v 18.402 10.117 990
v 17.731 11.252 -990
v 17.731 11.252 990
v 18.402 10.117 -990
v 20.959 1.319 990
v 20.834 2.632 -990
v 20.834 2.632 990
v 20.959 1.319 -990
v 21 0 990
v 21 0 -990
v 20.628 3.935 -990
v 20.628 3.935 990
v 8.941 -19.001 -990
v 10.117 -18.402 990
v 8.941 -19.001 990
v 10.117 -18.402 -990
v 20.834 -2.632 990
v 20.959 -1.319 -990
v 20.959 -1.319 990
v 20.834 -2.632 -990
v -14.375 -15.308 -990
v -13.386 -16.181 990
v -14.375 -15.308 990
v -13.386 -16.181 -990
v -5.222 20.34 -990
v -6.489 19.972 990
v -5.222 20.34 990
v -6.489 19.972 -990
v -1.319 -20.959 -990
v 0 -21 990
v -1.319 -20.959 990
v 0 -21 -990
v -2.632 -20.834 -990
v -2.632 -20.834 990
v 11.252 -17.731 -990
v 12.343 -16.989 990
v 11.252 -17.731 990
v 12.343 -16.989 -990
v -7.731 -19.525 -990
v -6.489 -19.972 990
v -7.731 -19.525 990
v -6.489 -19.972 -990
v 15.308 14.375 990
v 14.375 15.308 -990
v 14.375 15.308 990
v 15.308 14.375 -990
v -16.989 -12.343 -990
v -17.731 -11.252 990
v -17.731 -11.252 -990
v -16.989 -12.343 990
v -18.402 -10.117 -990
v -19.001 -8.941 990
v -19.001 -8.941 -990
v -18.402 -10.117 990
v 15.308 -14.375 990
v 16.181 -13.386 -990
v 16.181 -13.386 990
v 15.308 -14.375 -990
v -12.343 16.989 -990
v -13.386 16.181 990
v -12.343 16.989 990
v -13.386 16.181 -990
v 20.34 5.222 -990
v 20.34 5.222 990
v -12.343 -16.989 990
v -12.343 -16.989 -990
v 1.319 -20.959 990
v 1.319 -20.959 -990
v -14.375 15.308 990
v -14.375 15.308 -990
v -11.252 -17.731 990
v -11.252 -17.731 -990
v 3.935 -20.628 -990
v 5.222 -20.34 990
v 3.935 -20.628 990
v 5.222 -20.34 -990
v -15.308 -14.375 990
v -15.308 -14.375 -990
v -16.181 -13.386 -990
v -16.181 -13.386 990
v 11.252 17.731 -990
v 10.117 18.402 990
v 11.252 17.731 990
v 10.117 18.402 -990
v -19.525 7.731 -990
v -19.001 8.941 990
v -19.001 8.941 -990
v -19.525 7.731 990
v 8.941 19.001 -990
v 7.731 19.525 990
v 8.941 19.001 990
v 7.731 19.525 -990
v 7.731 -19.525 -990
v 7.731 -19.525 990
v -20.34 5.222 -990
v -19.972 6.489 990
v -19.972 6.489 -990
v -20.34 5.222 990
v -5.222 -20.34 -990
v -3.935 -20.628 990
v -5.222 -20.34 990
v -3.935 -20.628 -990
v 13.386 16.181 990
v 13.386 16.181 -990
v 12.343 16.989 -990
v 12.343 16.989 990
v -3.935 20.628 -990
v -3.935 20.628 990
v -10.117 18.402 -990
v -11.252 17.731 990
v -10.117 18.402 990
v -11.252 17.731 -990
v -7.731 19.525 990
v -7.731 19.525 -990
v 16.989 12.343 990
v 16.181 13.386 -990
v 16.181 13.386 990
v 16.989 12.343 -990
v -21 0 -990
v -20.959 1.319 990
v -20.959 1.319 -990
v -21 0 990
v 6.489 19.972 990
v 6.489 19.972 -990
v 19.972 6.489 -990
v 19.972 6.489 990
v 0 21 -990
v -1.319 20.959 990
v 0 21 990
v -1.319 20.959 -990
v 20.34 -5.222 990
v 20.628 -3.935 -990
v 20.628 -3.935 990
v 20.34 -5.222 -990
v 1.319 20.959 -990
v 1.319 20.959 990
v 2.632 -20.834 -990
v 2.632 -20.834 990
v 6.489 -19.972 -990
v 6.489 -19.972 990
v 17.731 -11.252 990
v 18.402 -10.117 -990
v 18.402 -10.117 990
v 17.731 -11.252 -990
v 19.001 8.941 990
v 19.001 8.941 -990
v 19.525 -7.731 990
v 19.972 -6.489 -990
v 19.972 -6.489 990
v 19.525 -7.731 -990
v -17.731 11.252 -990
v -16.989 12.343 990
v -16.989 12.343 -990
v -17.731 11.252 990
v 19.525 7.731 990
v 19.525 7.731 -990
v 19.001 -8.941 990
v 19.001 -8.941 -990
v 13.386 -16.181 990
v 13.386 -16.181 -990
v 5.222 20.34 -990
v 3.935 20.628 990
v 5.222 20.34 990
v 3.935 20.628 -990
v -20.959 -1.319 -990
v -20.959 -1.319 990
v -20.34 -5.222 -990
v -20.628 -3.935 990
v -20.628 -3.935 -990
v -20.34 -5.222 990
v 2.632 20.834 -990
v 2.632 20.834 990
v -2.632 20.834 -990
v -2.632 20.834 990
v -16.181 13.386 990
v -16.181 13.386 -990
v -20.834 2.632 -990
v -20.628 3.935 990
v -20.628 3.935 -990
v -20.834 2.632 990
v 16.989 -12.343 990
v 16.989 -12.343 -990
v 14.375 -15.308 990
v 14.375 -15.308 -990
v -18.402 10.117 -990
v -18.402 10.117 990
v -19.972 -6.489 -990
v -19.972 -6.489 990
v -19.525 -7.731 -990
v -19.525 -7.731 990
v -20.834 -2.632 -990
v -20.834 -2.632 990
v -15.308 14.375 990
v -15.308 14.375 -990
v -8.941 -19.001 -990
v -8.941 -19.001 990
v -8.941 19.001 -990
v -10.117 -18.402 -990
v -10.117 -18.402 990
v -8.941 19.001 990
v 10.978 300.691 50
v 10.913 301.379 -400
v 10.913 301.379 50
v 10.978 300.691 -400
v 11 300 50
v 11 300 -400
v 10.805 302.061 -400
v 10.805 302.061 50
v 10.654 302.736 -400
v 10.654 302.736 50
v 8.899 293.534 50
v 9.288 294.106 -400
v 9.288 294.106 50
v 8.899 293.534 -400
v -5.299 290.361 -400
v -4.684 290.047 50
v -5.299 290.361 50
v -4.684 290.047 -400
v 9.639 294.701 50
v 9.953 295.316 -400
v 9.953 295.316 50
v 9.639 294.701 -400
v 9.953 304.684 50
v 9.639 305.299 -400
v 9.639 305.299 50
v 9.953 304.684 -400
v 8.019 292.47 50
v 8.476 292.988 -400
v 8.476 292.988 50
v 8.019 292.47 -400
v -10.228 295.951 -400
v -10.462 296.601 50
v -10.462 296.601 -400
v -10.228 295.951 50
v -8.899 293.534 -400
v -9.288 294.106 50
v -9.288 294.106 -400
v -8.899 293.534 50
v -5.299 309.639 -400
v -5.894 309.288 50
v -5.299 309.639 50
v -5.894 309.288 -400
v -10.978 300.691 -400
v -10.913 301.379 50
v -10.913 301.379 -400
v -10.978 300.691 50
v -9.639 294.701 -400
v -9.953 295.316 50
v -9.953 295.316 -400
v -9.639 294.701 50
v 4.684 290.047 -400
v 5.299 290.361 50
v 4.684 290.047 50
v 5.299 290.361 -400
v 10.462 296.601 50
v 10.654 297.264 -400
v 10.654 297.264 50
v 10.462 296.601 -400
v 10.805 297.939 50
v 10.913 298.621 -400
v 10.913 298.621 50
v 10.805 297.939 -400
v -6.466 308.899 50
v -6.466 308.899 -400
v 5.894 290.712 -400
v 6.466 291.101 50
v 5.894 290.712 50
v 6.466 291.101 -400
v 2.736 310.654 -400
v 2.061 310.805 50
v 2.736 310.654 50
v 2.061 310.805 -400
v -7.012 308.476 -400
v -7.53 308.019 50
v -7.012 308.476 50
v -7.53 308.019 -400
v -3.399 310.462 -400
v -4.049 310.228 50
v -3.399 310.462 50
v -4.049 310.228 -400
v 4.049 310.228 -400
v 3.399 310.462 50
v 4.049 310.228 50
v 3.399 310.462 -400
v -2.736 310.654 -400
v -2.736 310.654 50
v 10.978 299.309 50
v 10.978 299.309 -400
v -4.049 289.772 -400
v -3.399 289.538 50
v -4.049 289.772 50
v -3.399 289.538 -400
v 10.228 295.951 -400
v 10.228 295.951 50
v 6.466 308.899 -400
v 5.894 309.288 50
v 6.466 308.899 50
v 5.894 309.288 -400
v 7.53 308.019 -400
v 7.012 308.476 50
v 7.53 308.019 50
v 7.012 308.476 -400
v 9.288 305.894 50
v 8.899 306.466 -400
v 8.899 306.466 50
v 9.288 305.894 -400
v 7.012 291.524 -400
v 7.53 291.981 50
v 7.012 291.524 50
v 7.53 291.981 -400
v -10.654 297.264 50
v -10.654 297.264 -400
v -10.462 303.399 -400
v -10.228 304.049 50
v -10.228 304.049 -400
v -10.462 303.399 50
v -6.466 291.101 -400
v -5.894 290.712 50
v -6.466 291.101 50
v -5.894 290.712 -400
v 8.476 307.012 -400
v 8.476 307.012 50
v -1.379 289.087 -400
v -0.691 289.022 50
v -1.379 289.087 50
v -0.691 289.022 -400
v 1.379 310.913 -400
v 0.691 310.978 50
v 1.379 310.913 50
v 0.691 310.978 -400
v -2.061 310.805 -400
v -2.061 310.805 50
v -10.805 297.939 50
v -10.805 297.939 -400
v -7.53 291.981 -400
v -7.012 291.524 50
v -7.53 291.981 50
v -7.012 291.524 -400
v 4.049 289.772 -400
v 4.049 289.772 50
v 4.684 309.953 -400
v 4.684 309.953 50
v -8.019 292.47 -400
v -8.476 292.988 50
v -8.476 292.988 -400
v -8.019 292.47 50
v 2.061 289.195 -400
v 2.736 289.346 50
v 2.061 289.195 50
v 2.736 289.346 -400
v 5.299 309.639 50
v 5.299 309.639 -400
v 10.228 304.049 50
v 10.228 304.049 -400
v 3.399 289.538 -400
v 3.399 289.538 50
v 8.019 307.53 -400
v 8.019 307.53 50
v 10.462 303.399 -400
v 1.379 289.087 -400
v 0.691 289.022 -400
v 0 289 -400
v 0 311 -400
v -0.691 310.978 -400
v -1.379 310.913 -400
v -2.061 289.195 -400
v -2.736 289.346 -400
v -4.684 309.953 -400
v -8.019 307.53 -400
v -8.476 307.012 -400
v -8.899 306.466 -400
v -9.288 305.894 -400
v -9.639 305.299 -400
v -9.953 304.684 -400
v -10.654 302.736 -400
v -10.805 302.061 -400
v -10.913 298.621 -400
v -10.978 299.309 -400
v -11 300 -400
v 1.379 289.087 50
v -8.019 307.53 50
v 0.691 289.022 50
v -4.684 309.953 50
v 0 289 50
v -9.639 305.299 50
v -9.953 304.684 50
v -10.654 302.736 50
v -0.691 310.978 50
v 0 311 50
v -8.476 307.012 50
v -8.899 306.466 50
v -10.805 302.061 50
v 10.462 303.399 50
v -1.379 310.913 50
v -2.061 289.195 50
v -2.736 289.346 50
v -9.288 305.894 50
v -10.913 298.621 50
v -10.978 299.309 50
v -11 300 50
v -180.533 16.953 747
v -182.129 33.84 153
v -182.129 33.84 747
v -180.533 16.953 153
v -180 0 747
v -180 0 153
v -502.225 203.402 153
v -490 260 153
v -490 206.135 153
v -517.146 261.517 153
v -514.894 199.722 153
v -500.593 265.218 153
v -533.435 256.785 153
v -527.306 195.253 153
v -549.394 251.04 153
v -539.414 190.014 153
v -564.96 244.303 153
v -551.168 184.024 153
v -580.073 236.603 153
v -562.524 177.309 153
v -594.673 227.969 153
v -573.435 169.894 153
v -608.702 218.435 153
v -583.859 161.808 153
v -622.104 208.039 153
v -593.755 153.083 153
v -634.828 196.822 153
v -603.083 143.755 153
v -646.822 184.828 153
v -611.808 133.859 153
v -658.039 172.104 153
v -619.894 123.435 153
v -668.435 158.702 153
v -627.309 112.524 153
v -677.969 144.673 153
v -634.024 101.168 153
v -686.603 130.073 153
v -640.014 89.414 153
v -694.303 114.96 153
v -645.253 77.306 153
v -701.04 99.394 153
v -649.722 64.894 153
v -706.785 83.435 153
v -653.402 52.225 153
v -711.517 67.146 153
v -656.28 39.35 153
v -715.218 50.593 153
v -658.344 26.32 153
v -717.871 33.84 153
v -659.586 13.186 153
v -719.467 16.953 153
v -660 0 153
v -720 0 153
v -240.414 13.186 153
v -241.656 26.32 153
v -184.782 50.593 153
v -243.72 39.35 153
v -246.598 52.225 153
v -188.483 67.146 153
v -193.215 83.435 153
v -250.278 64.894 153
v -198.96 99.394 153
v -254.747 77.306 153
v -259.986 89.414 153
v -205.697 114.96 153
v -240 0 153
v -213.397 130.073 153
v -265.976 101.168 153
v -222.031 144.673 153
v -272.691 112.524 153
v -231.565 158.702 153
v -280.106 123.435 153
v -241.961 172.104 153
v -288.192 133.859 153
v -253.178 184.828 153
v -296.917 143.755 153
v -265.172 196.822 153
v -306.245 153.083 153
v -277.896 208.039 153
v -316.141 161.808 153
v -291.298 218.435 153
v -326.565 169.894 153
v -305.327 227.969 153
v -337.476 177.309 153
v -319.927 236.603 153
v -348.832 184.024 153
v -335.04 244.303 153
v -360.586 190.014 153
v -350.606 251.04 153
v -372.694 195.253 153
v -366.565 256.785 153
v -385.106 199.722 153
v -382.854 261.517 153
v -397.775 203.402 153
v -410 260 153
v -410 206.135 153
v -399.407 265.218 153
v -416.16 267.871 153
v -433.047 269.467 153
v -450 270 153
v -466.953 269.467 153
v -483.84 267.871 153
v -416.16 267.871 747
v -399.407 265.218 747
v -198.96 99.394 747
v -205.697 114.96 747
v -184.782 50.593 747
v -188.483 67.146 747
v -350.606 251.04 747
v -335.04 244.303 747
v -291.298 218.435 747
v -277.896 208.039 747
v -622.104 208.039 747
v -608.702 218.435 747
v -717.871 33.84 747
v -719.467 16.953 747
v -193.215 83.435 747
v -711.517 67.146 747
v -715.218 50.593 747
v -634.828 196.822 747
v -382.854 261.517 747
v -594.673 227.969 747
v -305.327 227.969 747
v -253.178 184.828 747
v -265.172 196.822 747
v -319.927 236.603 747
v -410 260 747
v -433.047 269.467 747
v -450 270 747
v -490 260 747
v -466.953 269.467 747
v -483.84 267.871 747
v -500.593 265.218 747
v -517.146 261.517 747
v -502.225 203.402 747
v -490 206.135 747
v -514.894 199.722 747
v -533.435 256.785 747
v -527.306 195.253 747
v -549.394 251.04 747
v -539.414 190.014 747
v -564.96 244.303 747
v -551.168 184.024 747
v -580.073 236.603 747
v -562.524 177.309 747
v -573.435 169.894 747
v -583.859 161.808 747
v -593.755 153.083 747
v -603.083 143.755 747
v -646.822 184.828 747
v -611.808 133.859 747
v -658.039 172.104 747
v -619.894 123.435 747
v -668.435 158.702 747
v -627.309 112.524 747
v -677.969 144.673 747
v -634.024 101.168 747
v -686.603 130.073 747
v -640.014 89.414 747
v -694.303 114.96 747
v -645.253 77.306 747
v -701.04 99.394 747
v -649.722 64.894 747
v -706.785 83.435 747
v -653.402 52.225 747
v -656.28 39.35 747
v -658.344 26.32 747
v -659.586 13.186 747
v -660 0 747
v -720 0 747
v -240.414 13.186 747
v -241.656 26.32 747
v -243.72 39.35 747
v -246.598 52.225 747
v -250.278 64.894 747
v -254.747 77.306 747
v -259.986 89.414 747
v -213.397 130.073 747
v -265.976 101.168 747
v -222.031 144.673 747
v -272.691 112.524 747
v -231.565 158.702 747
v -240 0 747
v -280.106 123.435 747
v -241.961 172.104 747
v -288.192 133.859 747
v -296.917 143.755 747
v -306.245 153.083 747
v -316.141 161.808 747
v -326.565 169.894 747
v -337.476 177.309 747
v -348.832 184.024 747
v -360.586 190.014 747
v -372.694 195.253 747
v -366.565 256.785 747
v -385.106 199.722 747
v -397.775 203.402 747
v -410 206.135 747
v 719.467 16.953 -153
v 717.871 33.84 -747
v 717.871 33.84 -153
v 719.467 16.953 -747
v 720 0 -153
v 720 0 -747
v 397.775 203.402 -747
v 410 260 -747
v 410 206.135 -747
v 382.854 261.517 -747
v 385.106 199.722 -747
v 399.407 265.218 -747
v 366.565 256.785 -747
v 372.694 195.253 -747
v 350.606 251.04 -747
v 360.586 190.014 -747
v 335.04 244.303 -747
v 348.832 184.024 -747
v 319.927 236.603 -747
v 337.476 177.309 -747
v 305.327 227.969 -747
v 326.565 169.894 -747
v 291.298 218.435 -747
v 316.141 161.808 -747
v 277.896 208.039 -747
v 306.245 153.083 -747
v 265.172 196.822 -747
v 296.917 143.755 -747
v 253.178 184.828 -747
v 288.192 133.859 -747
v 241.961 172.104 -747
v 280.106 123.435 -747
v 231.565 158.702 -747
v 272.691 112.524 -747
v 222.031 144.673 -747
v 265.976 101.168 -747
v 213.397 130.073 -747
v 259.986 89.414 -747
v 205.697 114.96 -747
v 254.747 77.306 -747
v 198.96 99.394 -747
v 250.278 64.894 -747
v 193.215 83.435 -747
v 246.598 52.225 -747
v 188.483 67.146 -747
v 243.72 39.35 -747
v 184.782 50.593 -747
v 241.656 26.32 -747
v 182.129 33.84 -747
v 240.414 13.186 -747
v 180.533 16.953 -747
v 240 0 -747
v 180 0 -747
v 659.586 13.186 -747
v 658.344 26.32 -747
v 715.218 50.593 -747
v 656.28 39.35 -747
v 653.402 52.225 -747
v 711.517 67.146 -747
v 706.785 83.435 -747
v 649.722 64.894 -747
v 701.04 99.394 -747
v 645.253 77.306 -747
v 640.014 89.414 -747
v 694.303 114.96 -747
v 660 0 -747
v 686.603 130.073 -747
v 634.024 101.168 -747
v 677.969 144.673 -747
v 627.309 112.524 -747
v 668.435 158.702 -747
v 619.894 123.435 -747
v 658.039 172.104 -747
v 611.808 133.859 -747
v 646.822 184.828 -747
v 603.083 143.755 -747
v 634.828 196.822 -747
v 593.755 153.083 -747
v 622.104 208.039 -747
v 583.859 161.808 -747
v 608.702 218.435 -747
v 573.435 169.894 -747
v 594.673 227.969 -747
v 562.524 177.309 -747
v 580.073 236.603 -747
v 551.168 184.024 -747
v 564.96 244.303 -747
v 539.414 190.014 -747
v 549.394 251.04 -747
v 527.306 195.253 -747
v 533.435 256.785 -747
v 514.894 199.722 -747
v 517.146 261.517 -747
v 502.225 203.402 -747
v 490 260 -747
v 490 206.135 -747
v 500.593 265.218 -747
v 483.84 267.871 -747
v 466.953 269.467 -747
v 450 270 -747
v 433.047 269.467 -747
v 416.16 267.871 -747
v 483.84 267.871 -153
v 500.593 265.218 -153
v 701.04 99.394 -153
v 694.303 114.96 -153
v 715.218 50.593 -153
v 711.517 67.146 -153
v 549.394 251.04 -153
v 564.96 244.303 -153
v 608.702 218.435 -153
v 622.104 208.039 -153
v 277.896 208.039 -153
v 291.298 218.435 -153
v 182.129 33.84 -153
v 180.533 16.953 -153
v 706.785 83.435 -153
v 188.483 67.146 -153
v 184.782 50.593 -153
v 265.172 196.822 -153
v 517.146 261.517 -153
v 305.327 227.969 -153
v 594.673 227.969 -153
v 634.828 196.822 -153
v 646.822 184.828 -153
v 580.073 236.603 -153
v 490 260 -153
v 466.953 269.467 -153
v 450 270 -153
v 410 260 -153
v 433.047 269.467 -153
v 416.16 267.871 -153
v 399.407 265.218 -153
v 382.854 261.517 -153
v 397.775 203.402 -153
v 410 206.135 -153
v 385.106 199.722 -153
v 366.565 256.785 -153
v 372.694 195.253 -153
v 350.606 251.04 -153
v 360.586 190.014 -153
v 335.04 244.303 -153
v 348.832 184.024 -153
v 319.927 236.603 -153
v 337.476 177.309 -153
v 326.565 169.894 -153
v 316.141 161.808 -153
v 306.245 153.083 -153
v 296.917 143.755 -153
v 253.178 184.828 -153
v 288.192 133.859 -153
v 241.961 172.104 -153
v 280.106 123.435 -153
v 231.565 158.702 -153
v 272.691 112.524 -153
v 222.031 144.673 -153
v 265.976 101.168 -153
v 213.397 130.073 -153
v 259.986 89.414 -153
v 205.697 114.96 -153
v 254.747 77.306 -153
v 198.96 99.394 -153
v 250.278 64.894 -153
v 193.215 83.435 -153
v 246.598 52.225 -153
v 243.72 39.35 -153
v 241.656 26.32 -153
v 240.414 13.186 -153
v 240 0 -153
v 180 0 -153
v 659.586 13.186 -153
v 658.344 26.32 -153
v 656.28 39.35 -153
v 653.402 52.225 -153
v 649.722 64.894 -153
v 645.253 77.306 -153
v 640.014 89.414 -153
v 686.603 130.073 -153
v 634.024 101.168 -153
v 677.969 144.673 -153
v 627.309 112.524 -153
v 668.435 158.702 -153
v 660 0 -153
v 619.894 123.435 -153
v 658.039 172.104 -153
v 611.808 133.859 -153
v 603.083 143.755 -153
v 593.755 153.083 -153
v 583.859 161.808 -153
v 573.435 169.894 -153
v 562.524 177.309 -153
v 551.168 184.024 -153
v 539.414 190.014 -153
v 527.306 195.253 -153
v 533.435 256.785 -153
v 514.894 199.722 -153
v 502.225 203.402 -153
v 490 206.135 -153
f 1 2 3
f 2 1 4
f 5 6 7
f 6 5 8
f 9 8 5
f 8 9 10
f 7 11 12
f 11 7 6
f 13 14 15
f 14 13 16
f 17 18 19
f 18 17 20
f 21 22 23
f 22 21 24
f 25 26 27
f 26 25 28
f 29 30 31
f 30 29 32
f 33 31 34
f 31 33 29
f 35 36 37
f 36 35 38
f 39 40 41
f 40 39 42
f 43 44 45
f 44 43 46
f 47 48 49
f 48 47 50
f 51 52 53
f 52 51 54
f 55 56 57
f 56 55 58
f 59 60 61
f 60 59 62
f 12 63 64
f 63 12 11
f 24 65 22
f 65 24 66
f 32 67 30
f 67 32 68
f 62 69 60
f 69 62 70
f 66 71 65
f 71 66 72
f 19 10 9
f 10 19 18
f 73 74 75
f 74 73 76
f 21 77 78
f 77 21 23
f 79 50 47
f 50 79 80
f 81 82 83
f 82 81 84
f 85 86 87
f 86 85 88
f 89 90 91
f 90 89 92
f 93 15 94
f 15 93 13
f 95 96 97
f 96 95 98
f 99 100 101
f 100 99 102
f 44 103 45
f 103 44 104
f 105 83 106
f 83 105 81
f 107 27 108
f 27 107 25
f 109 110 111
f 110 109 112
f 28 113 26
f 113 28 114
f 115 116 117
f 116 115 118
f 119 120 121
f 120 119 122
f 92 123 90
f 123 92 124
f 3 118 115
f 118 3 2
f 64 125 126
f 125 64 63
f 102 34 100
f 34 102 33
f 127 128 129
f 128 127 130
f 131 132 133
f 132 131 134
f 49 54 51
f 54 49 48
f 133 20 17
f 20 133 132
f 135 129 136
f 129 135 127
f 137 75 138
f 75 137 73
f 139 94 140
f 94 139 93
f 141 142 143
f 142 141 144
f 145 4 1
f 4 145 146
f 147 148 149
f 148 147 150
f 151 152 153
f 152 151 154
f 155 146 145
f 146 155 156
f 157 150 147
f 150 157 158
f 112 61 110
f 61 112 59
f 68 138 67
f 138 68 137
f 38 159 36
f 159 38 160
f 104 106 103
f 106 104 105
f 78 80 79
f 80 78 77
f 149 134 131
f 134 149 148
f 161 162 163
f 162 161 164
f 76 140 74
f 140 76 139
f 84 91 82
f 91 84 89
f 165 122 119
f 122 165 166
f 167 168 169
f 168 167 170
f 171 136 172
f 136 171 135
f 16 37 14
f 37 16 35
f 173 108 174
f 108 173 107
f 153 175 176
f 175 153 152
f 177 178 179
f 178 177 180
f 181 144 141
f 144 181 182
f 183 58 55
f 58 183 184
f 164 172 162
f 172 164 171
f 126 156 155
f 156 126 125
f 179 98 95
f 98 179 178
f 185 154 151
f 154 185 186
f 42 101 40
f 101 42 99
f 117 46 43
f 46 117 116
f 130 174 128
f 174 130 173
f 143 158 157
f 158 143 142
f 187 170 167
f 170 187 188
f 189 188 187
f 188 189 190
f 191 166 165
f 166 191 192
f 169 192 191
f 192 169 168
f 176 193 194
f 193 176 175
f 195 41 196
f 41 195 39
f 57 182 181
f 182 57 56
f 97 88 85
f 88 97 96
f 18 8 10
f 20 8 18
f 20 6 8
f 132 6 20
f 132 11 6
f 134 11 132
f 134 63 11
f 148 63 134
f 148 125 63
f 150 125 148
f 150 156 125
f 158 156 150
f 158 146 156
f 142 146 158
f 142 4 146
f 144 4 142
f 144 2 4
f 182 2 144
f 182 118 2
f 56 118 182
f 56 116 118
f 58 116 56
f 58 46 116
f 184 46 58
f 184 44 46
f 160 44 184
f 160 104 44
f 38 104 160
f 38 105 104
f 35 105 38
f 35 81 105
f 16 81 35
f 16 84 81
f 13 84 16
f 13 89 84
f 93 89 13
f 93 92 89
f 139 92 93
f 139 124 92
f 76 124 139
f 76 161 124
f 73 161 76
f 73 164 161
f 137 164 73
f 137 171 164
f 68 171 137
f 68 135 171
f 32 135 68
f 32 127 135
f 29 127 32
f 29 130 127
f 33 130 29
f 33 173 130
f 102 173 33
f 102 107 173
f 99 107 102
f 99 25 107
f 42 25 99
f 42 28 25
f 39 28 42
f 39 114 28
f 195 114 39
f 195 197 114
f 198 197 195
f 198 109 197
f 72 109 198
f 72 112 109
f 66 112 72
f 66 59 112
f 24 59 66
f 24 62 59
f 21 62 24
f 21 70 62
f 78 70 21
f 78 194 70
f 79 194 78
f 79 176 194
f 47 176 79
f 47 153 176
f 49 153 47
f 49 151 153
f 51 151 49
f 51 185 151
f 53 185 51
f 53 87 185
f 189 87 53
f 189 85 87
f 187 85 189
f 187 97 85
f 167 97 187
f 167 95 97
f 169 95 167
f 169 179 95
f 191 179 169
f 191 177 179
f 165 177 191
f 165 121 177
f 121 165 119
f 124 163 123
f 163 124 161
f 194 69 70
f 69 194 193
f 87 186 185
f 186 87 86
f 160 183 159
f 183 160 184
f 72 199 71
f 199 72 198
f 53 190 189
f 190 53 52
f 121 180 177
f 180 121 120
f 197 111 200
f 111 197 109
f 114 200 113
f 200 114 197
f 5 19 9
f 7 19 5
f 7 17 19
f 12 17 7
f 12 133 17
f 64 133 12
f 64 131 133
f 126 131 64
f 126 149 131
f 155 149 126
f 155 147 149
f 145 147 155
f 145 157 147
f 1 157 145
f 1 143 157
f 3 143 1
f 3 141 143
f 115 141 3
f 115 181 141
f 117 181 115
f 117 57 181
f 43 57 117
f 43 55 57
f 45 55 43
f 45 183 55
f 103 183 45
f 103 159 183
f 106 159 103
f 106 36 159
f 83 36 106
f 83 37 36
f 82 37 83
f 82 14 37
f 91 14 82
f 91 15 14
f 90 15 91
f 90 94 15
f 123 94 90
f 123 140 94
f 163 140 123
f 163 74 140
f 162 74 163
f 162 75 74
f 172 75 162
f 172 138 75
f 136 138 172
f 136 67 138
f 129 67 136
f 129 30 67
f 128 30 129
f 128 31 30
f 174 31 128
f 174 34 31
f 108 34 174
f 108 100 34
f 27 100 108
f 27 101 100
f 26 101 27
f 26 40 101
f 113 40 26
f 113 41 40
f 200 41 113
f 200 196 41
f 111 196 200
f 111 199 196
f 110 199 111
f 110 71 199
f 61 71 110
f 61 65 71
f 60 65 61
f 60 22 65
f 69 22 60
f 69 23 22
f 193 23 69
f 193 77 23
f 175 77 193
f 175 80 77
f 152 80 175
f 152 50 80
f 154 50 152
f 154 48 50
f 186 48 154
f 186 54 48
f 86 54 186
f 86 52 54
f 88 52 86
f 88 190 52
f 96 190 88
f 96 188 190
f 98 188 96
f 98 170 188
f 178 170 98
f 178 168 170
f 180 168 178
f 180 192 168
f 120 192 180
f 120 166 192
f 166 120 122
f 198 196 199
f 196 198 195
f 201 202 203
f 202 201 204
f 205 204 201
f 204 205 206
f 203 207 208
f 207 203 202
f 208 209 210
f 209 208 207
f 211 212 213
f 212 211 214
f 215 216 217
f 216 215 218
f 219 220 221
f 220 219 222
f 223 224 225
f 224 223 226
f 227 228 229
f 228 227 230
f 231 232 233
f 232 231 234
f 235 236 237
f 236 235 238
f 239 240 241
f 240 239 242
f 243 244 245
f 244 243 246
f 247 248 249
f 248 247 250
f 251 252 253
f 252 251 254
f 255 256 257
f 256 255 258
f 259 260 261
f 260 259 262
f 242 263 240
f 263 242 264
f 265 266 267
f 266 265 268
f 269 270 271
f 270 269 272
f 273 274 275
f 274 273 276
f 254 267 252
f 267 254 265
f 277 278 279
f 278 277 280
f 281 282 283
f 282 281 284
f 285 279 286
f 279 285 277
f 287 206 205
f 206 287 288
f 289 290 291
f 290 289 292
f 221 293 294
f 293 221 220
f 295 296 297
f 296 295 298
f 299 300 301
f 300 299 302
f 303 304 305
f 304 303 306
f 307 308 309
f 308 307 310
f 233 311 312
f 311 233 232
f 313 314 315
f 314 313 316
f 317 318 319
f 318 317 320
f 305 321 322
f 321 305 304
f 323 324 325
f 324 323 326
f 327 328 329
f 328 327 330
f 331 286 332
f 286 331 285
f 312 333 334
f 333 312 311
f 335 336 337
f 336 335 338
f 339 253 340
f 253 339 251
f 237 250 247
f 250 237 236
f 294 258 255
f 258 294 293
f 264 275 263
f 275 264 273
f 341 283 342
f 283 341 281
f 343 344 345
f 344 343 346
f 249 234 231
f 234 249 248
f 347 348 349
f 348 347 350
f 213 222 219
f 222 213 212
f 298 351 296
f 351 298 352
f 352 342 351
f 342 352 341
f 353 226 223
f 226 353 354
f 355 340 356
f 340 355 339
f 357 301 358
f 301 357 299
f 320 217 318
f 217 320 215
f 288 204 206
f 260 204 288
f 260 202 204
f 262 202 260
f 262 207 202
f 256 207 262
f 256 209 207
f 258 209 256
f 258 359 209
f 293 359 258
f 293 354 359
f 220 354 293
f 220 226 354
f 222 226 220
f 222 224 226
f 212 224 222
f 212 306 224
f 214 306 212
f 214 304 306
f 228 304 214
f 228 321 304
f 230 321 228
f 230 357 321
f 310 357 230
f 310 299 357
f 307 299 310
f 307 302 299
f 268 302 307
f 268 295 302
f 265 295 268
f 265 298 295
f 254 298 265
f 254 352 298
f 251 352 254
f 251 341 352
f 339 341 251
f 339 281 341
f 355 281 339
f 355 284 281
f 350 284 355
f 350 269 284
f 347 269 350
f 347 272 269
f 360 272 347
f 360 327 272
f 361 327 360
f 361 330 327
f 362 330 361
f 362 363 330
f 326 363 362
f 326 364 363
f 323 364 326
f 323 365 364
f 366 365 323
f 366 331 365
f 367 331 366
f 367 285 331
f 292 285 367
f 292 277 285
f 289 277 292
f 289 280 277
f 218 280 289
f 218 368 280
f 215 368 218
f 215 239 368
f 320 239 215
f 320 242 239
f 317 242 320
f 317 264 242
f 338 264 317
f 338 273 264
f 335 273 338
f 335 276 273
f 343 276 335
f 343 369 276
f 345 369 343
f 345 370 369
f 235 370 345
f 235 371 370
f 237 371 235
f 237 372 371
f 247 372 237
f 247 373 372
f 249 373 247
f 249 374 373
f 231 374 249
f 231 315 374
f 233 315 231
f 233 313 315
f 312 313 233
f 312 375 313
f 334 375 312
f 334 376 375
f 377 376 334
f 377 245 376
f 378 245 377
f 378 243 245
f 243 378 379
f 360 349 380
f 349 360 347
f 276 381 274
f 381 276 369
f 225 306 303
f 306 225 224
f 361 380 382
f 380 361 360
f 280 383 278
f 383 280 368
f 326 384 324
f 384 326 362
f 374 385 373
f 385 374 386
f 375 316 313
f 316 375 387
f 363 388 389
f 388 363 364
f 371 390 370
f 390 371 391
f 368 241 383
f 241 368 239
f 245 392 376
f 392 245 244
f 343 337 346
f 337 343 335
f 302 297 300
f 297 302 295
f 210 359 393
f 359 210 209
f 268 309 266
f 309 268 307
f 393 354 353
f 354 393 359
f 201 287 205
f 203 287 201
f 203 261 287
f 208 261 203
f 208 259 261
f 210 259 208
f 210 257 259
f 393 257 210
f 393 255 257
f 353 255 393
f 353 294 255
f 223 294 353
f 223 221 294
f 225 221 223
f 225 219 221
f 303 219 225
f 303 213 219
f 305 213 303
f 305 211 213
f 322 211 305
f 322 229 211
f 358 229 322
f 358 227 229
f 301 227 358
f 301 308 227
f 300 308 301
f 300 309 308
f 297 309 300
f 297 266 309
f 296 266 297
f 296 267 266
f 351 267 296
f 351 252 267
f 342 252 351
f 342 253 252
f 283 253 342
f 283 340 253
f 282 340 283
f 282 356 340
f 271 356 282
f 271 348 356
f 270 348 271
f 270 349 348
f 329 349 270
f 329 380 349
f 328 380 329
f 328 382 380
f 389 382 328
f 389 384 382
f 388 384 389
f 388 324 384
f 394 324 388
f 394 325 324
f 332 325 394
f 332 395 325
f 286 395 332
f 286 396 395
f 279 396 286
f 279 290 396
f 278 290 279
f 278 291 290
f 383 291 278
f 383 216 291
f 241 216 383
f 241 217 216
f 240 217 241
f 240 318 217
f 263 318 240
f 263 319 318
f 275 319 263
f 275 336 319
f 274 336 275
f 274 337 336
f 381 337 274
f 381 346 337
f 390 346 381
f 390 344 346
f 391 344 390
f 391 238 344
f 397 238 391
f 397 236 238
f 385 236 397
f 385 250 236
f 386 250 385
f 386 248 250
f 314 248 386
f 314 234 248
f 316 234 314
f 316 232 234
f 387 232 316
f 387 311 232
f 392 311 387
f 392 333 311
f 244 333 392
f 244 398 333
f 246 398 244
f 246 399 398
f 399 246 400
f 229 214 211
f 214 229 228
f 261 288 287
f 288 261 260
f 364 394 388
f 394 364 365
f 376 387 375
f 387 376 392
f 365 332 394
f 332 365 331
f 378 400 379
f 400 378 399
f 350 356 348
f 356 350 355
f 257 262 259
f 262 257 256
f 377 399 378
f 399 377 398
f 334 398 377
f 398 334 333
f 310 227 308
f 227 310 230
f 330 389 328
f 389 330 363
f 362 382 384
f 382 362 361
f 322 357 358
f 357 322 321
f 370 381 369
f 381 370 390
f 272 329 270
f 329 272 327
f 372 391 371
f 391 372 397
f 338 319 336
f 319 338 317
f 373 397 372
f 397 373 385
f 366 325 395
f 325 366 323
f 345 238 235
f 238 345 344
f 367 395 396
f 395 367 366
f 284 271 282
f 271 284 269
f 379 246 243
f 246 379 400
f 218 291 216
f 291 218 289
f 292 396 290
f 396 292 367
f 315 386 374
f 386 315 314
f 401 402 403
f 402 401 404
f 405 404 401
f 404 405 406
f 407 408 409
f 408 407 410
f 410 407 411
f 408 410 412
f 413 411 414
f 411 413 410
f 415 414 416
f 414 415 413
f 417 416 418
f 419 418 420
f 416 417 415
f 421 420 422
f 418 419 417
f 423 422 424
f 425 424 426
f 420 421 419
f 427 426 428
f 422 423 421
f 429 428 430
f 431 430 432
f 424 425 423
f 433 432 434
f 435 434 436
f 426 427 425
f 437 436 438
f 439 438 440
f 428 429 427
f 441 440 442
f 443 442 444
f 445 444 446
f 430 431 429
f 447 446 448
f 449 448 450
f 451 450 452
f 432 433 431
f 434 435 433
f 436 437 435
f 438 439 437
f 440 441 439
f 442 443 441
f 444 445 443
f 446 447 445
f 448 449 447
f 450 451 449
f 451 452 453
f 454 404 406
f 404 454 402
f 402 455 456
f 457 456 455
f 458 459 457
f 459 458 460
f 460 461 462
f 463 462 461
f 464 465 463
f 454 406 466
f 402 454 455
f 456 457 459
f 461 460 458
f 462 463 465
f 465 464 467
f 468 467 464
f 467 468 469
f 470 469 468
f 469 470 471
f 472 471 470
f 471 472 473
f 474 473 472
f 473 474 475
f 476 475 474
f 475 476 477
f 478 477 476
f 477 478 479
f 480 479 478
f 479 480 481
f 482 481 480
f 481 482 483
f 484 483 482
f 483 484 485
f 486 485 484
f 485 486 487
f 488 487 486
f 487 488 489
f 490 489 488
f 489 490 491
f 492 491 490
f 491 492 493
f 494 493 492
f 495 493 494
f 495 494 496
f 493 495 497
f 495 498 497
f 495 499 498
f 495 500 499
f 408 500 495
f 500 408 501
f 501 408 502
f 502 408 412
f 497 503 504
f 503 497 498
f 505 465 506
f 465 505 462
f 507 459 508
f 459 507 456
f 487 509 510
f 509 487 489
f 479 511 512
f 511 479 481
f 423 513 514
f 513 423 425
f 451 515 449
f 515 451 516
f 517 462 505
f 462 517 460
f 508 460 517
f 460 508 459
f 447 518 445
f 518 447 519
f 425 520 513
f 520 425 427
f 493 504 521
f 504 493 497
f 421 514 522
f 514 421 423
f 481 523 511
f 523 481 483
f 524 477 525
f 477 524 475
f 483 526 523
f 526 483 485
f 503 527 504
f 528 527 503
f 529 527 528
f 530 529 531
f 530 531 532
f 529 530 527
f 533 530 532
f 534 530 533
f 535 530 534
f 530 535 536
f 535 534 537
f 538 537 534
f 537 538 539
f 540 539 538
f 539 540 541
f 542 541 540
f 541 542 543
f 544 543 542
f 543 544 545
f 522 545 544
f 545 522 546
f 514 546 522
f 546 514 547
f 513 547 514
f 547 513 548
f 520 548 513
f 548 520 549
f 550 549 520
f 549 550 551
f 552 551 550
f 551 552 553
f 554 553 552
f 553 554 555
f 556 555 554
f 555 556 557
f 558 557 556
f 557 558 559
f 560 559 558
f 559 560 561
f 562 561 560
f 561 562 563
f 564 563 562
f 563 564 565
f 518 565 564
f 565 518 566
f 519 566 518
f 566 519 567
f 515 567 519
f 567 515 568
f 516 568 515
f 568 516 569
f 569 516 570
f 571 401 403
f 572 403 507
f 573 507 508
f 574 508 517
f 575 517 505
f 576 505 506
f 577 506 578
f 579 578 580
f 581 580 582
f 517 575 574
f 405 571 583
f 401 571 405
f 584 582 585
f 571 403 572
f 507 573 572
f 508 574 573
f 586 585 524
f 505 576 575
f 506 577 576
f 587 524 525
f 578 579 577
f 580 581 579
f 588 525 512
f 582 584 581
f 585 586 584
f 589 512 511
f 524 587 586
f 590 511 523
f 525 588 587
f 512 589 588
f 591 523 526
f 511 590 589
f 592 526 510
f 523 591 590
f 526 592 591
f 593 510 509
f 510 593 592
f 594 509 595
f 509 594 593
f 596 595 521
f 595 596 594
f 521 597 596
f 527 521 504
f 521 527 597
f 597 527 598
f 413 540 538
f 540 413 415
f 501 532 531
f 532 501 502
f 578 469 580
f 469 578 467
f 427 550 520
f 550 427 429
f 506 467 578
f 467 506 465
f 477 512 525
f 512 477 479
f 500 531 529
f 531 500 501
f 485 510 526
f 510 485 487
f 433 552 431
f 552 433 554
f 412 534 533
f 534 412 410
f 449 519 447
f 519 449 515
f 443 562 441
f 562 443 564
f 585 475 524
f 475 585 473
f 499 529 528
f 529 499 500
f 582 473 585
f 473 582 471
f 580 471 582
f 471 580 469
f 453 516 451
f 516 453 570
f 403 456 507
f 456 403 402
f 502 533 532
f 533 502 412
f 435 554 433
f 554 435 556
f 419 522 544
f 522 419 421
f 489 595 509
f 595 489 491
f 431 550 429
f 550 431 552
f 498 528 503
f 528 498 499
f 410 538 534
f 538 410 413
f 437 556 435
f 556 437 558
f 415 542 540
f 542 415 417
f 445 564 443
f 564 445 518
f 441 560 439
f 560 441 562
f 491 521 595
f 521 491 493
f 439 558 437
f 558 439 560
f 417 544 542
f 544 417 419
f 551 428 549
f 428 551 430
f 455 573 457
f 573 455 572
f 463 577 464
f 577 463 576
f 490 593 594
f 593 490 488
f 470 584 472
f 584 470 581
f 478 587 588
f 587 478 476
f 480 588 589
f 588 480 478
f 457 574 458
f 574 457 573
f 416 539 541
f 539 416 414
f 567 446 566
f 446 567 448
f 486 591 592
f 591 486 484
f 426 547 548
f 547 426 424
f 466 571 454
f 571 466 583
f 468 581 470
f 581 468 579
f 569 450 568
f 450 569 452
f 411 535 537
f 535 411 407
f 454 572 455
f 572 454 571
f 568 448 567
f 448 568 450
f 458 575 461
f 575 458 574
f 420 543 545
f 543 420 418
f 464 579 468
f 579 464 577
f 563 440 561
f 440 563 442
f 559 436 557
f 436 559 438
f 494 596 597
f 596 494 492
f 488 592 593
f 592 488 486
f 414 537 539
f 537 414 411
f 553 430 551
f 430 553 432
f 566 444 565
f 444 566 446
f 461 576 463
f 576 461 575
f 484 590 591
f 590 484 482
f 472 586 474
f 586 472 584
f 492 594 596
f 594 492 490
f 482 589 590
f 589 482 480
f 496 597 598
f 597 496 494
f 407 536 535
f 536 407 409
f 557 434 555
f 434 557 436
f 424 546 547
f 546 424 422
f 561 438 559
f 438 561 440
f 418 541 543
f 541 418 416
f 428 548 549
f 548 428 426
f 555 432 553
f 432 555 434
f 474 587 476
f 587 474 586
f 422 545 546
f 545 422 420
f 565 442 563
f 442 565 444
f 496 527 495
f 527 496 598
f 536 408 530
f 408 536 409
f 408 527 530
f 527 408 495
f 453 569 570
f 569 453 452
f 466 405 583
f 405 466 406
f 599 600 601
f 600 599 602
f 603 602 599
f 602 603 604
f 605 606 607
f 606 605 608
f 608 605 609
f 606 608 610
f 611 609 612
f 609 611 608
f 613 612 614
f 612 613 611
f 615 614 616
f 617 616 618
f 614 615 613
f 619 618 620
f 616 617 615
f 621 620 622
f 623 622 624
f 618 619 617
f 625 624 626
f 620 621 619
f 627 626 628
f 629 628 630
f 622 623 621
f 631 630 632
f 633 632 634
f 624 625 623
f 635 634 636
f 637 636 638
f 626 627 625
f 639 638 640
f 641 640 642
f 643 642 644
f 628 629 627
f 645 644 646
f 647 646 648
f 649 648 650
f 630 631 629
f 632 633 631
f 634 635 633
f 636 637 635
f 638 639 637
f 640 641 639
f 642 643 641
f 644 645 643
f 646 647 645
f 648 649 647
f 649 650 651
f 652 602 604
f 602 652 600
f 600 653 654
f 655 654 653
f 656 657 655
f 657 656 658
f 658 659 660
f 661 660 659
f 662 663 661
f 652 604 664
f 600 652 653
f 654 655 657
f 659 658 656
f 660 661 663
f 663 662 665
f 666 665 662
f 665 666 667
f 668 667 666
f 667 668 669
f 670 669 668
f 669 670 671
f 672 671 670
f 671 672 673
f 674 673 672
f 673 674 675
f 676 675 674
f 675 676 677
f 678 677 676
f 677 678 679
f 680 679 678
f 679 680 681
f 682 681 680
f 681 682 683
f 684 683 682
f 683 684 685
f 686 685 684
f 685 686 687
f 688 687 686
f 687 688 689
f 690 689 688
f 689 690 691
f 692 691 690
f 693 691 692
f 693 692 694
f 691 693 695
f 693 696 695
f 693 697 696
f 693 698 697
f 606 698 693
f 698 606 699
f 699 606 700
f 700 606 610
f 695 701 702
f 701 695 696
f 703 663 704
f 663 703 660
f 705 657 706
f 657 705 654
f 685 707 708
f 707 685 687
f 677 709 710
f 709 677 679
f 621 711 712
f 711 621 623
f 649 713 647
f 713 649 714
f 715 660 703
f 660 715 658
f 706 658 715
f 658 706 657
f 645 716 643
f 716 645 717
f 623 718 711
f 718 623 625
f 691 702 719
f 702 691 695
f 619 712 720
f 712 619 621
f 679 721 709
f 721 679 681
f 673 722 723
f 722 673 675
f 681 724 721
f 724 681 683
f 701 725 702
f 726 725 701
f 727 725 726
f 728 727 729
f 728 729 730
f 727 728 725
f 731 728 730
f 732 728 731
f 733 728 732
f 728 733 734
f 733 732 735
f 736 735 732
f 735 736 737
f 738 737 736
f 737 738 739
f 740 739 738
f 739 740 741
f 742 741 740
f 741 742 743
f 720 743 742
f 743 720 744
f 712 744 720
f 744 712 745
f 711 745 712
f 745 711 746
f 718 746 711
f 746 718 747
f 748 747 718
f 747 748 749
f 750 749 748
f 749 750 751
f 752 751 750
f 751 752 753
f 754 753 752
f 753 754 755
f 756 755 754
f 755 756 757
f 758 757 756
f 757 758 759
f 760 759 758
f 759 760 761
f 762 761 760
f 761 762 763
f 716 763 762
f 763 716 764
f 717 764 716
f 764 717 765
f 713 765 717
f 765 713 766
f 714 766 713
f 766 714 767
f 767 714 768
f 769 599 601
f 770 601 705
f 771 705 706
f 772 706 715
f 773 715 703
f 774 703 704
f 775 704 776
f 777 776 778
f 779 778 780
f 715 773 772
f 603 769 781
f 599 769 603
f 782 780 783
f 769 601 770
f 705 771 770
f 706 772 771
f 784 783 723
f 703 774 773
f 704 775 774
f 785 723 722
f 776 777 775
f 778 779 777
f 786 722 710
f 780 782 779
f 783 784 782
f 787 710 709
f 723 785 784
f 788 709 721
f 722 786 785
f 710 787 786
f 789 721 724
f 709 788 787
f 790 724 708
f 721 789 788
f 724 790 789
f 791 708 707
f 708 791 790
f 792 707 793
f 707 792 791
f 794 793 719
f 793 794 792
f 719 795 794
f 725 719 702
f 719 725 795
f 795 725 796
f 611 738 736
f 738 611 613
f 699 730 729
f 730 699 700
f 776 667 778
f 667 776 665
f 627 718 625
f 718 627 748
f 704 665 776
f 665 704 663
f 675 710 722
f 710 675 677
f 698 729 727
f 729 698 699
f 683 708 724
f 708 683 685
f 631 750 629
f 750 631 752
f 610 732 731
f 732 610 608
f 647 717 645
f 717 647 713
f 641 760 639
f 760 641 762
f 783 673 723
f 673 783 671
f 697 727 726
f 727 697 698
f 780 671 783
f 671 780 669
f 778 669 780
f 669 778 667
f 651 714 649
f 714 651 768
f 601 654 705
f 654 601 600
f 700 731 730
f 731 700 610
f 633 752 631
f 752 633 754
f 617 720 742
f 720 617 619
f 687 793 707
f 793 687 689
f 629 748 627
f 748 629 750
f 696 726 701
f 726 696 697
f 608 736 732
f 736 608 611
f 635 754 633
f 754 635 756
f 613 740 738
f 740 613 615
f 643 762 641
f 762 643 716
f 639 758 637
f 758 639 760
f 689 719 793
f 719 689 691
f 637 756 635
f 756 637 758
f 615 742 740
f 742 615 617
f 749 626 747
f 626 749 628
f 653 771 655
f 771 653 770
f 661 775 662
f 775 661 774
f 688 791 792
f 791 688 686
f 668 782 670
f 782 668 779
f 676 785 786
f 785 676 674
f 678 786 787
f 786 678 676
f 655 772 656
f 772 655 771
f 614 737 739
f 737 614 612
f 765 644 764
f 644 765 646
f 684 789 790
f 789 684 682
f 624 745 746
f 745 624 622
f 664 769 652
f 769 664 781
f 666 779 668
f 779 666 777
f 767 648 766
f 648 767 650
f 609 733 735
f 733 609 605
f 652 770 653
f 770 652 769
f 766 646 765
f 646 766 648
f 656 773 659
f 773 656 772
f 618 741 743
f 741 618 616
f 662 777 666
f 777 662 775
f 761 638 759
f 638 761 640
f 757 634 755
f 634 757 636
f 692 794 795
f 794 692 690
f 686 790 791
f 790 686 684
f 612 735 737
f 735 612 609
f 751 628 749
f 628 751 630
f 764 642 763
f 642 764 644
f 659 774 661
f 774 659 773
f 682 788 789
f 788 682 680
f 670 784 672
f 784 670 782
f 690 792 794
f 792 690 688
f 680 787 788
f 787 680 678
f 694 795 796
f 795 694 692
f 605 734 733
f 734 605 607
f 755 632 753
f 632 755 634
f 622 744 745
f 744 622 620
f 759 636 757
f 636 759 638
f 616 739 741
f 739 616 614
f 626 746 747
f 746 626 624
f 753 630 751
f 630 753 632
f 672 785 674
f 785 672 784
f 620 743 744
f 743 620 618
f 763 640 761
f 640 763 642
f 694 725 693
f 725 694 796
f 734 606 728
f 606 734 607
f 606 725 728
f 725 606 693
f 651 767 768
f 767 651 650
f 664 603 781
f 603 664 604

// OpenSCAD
// ============================================================================
// PROJECT: XXXG-00W0 WING GUNDAM ZERO EW - FLIGHT SURFACE INFRA
// COMPONENT VAULT: BANDAI CAST RUNNER W - PLUMAGE EXTENSIONS W11 & W12
// PACKAGING RE-ARCHITECTURE: SUB-ARMOR CAPACITOR RECESSED BANK INTEGRATION
// CONFIG METRIC: SCALED TITANIUM CASTS (1:1 ACTUAL METRIC UP-SCALE)
// ============================================================================

$fn = 100; // High-precision circular resolution segment count

// Structural Constants Scaled 1:1 for a 16.7-Meter Airframe Scale (mm)
extension_total_length = 1320;           // Total longitudinal vertical height (mm)
pivot_bore_diameter = 420;               // Core cycloidal stabilizer pin width (mm)
armor_skin_thickness = 60;              // Solid TiAl protective plating wall (mm)
harness_conduit_width = 80;             // Cast-in 4oz copper logic trace track (mm)
capacitor_pocket_depth = 15;            // Sub-armor recessed housing pocket depth (mm)
capacitor_pocket_width = 140;           // Transverse MLCC array pocket width (mm)

module Runner_W_Plumage_Extension_Forge() {
    // Central Supply Injection Runner Axis (Molten Feed Line from Siphon Forge)
    color([0.22, 0.22, 0.25]) {
        cylinder(h = extension_total_length * 1.5, d = 42, center = true);
        // Direct injection gates tracking straight into the part mold cavities
        translate() rotate() cylinder(h = 450, d = 22);
        translate([0, 300, -400]) rotate() cylinder(h = 450, d = 22);
    }
    
    // Instantiate Scaled Skeutomorphic Part Molds Symmetrically (Left & Right)
    Cast_Internal_Plumage_Extensions();
}

module Cast_Internal_Plumage_Extensions() {
    // ---- PART W11: INTERNAL LEFT DISTAL PLUMAGE EXTENSION STABILIZER ----
    translate([-450, 0, 450]) color([0.35, 0.35, 0.38]) { // Inner Frame Dark Spec
        difference() {
            // Main solid heavy-duty core joint connection block segment
            cylinder(h = extension_total_length * 0.45, d = pivot_bore_diameter + (armor_skin_thickness * 2), center = true);
            
            // Central Cycloidal Reduction Track Bore (Houses pre-loaded alignment pins)
            cylinder(h = extension_total_length * 0.5, d = pivot_bore_diameter, center = true);
            
            // SUB-ARMOR RECESSED CAPACITOR POCKETS [Segmented rows cut inside the armor inner wall]
            for (z_offset = [-150, 0, 150]) {
                translate([0, (pivot_bore_diameter/2 - armor_skin_thickness + capacitor_pocket_depth/2), z_offset])
                    cube([capacitor_pocket_width, capacitor_pocket_depth, 100], center = true);
            }
            
            // Continuous cast-in routing track for the 4oz solid-state wiring rails
            cube([harness_conduit_width, pivot_bore_diameter + 100, extension_total_length], center = true);
            
            // Slicing profile tool to generate an asymmetrical half-shell part component
            translate([0, -pivot_bore_diameter, 0])
                cube([pivot_bore_diameter * 2, pivot_bore_diameter * 2, extension_total_length * 2], center = true);
        }
    }
    
    // ---- PART W12: INTERNAL RIGHT DISTAL PLUMAGE EXTENSION STABILIZER ----
    translate([450, 0, -450]) rotate() color([0.35, 0.35, 0.38]) {
        difference() {
            cylinder(h = extension_total_length * 0.45, d = pivot_bore_diameter + (armor_skin_thickness * 2), center = true);
            cylinder(h = extension_total_length * 0.5, d = pivot_bore_diameter, center = true);
            
            for (z_offset = [-150, 0, 150]) {
                translate([0, (pivot_bore_diameter/2 - armor_skin_thickness + capacitor_pocket_depth/2), z_offset])
                    cube([capacitor_pocket_width, capacitor_pocket_depth, 100], center = true);
            }
            
            cube([harness_conduit_width, pivot_bore_diameter + 100, extension_total_length], center = true);
            translate([0, -pivot_bore_diameter, 0])
                cube([pivot_bore_diameter * 2, pivot_bore_diameter * 2, extension_total_length * 2], center = true);
        }
    }
}

// Render Master Assembly to Parameter Workspace
Runner_W_Plumage_Extension_Forge();
